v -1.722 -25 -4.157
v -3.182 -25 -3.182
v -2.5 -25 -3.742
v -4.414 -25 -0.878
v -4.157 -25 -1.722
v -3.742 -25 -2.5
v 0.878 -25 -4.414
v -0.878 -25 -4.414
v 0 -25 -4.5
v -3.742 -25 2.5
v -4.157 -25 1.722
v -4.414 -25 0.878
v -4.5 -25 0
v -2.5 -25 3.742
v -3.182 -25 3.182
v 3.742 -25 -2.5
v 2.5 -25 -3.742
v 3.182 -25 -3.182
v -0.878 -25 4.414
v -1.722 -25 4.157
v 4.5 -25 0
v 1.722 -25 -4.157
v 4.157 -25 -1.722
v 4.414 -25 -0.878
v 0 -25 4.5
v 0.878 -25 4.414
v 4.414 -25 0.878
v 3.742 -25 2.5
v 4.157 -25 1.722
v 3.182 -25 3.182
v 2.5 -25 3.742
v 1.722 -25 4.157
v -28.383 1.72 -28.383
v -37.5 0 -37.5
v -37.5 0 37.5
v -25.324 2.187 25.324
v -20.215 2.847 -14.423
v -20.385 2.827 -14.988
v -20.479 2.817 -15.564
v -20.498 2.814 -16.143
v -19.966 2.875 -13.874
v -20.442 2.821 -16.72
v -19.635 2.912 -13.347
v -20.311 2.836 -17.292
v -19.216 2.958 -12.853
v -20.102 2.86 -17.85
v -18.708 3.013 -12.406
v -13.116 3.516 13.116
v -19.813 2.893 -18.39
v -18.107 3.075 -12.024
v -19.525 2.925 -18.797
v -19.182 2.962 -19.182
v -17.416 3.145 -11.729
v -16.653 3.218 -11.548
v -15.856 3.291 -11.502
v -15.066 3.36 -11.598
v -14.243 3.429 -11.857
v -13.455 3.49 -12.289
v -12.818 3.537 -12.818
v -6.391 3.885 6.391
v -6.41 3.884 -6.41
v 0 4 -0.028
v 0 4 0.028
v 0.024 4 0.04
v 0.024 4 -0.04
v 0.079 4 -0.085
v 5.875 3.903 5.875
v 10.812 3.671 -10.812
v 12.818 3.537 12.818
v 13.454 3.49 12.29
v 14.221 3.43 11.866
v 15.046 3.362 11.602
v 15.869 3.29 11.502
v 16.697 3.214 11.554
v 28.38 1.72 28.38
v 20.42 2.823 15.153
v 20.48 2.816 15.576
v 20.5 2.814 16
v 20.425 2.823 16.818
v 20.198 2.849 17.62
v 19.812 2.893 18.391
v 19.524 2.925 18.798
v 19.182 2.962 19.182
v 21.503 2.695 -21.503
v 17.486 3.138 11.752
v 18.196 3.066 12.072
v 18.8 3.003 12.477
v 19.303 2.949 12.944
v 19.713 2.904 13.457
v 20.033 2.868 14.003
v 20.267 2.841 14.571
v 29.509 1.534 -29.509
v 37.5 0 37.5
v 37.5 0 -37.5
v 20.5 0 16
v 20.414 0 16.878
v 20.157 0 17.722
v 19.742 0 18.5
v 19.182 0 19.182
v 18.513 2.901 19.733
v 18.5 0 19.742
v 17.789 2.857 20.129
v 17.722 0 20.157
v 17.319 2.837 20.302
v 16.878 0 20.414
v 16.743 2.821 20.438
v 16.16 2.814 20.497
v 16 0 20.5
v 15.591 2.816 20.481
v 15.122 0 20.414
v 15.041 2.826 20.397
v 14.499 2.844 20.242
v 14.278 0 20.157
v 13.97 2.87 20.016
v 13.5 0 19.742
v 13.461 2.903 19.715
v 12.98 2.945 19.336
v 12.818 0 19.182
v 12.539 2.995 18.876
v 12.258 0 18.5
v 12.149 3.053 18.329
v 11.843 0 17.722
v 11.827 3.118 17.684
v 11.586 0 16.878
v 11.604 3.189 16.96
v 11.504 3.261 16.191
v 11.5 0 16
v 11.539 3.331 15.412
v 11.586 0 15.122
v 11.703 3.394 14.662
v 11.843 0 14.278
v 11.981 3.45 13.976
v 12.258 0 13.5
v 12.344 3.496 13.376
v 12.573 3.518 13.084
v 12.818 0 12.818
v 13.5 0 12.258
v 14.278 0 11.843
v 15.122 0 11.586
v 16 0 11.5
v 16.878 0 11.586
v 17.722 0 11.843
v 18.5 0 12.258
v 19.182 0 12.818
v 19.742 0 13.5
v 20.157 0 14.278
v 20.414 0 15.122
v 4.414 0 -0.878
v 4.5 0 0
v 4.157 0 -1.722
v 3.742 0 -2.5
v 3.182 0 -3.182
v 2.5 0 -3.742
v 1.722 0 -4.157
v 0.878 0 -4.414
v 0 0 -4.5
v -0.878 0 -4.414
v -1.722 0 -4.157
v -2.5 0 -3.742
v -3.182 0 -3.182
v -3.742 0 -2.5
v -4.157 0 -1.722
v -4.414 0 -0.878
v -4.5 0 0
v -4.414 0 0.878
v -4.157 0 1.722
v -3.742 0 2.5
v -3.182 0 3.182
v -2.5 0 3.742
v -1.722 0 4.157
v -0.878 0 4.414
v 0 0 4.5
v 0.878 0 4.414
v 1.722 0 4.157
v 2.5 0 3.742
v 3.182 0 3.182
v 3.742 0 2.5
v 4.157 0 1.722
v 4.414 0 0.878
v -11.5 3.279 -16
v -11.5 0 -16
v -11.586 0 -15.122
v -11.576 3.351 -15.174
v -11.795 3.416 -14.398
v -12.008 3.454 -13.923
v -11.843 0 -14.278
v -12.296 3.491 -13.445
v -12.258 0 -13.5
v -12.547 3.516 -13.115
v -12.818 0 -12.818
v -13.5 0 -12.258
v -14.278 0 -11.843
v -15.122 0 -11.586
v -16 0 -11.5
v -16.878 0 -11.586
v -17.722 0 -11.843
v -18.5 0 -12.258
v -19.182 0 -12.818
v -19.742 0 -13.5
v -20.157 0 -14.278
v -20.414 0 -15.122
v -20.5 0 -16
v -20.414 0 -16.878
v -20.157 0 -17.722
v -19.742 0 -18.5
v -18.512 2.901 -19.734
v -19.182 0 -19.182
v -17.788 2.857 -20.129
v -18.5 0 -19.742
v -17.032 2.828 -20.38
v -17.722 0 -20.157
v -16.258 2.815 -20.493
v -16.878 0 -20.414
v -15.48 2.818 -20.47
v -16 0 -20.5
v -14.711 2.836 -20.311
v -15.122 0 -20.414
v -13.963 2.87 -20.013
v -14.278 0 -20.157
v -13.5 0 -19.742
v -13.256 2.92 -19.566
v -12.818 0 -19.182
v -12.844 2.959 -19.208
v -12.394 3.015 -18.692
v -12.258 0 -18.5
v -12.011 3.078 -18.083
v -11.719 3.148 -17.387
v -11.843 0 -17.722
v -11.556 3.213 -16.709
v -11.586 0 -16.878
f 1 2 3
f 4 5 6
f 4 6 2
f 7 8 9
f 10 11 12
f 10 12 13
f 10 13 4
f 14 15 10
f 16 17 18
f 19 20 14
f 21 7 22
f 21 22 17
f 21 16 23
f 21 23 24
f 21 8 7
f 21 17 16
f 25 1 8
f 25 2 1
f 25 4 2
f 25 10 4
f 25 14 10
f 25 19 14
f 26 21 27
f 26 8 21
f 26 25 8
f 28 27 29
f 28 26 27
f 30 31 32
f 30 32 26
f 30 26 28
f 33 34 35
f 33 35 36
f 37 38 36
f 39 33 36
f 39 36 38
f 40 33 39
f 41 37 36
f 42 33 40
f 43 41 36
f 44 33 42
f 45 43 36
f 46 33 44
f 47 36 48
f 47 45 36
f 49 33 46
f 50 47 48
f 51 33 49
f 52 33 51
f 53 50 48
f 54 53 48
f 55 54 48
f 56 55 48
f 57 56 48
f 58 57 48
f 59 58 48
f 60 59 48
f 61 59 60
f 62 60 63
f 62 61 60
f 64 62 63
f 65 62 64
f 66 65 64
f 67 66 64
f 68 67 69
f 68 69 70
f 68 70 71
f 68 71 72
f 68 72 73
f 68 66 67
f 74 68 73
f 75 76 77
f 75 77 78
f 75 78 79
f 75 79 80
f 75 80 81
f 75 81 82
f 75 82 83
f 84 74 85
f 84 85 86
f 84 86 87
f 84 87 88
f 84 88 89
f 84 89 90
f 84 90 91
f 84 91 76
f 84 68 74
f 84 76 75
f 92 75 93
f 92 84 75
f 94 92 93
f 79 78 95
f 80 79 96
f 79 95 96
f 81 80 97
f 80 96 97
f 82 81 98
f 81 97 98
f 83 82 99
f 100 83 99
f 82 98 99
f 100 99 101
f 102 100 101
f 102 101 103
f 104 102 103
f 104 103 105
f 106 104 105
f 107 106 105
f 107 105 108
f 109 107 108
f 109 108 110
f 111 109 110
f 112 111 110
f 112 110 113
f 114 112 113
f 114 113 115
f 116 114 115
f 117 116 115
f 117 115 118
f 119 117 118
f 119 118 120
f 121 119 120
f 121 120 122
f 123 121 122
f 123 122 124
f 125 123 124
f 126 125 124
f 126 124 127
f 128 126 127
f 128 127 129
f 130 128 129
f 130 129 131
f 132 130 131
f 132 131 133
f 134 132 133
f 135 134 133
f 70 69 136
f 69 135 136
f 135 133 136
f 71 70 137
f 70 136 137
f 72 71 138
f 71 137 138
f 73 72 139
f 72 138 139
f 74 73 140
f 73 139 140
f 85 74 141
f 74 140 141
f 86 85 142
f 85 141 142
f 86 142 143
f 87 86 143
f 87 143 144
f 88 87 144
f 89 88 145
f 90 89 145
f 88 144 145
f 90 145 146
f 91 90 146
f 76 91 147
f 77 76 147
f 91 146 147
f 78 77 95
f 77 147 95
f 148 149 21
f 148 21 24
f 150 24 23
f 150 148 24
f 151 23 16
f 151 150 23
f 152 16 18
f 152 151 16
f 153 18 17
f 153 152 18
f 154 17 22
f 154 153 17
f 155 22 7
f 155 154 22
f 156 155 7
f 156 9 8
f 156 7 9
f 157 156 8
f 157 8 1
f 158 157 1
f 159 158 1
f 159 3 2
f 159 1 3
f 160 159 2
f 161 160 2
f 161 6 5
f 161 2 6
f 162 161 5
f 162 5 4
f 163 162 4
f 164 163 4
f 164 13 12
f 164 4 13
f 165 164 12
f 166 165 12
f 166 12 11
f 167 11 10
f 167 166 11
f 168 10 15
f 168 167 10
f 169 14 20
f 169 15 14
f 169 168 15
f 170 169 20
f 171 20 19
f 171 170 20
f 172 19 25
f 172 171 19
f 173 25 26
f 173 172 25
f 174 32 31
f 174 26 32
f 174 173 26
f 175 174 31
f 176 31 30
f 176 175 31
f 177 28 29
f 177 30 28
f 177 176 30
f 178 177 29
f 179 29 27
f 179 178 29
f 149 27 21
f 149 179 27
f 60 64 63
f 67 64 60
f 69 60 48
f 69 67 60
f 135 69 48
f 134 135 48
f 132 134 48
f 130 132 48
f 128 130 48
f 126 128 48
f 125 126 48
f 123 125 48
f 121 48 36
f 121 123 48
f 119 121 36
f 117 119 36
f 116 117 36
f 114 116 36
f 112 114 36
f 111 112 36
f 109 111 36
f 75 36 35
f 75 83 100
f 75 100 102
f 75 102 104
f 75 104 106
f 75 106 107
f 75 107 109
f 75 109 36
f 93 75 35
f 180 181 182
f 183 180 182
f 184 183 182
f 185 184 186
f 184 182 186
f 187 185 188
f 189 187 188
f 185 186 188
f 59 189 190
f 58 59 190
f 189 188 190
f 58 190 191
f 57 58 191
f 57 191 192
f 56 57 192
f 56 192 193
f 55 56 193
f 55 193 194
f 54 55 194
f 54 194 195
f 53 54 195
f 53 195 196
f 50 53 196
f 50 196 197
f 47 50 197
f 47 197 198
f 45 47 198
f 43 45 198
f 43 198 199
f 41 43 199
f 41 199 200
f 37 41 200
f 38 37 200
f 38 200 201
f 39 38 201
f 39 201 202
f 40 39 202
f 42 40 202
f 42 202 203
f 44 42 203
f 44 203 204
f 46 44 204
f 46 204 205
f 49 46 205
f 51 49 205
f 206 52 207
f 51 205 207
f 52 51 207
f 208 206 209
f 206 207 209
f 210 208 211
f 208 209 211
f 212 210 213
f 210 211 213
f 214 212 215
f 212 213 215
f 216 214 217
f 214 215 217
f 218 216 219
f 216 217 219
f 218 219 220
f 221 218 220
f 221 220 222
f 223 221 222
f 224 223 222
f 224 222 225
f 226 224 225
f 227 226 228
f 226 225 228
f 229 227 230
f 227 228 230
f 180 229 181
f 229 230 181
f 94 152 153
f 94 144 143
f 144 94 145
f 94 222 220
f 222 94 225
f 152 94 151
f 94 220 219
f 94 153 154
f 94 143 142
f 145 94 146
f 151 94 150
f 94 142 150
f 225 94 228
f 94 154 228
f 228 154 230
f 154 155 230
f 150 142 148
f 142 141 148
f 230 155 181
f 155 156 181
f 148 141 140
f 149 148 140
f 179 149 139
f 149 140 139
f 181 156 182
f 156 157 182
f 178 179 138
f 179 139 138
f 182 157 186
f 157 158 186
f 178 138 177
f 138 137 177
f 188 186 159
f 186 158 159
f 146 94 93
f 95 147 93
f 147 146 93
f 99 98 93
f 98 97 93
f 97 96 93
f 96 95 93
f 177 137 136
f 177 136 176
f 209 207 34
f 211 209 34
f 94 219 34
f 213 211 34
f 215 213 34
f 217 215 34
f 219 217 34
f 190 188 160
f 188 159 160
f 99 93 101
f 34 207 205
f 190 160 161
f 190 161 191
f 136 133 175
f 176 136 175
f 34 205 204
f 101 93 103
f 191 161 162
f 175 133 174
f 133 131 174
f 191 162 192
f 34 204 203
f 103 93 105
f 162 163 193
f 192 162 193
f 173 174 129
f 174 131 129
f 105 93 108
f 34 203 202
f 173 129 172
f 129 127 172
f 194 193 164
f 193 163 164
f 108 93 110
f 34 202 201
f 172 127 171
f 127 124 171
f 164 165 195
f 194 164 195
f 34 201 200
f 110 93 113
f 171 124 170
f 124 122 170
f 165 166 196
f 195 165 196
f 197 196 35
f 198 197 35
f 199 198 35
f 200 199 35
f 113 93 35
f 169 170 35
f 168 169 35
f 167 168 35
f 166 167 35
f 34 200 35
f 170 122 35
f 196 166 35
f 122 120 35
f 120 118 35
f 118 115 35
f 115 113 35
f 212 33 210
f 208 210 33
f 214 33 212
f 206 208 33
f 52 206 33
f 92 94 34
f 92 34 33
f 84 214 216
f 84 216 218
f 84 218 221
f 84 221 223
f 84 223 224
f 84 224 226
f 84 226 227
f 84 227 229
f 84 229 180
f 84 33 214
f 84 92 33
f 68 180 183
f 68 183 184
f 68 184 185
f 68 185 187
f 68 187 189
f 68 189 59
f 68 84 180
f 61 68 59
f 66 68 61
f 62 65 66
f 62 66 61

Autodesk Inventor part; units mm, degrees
ref_plane "YZ Plane" through (0, 0, 0) normal (1, 0, 0) x (0, 1, 0)
ref_plane "XZ Plane" through (0, 0, 0) normal (0, 1, 0) x (-1, 0, 0)
ref_plane "XY Plane" through (0, 0, 0) normal (0, 0, 1) x (1, 0, 0)
sketch "Sketch1" plane through (0, 0, 0) normal (0, 1, 0) x (-1, 0, 0)
  line L0 (37.5, -37.5) -> (-37.5, -37.5)
  line L1 (-37.5, -37.5) -> (-37.5, 37.5)
  line L2 (-37.5, 37.5) -> (37.5, 37.5)
  line L3 (37.5, 37.5) -> (37.5, -37.5)
  line L4 (37.5, -37.5) -> (-37.5, 37.5) construction
  line L5 (-37.5, -37.5) -> (37.5, 37.5) construction
  point P0 (0, 0)
  dimension "d0" = 75
  dimension "d1" = 75
sketch "Sketch2" plane through (0, 0, 0) normal (0, 1, 0) x (-1, 0, 0)
  line L0 (-25, -25) -> (25, -25)
  line L1 (25, -25) -> (25, 25)
  line L2 (25, 25) -> (-25, 25)
  line L3 (-25, 25) -> (-25, -25)
  line L4 (-25, -25) -> (25, 25) construction
  line L5 (25, -25) -> (-25, 25) construction
  point P0 (0, 0)
  dimension "d2" = 50
  dimension "d3" = 50
extrude "Extrusion1" add sketch "Sketch1" along normal blind 4
extrude "Extrusion2" [suppressed]
sketch "Sketch3" plane through (37.5, 0, 37.5) normal (1, 0, 0) x (0, 0, -1)
  line L0 (75, 4) -> (0, 4) projected
  line L1 (0, 0) -> (75, 0) projected
  line L2 (0, 0) -> (75, 0)
  arc A0 (75, 0) -> (0, 0) centre (37.5, -173.7812) ccw
  point P0 (37.5, 4)
extrude "Extrusion3" cut sketch "Sketch3" against normal through all keep common part
sketch "Sketch4" plane through (37.5, 0, -37.5) normal (0, 0, -1) x (-1, 0, 0)
  line L0 (75, 0) -> (75, 4) projected
  line L1 (0, 0) -> (75, 0)
  line L2 (0, 0) -> (0, 4) projected
  line L3 (75, 0) -> (0, 0) projected
  arc A0 (75, 0) -> (0, 0) centre (37.5, -173.7813) ccw
  point P0 (37.5, 0)
extrude "Extrusion4" cut sketch "Sketch4" against normal through all keep common part
sketch "Sketch5" plane through (0, 0, 0) normal (0, -1, 0) x (1, 0, 0)
  circle A0 centre (0, 0) radius 4.5
  dimension "d14" = 9
extrude "Extrusion5" add sketch "Sketch5" along normal blind 25
sketch "Sketch6" plane through (0, 0, 0) normal (0, -1, 0) x (1, 0, 0)
  circle A0 centre (-16, -16) radius 4.5
  circle A1 centre (16, 16) radius 4.5
  line L0 (0, 0) -> (37.5, 37.5) projected
  point P0 (0, 0)
  dimension "d17" = 9
  dimension "d18" = 9
  dimension "d19" = 16
  dimension "d20" = 16
  dimension "d21" = 16
  dimension "d22" = 16
extrude "Extrusion6" cut sketch "Sketch6" against normal through all
properties part number "thumper-bumper-trigger"
